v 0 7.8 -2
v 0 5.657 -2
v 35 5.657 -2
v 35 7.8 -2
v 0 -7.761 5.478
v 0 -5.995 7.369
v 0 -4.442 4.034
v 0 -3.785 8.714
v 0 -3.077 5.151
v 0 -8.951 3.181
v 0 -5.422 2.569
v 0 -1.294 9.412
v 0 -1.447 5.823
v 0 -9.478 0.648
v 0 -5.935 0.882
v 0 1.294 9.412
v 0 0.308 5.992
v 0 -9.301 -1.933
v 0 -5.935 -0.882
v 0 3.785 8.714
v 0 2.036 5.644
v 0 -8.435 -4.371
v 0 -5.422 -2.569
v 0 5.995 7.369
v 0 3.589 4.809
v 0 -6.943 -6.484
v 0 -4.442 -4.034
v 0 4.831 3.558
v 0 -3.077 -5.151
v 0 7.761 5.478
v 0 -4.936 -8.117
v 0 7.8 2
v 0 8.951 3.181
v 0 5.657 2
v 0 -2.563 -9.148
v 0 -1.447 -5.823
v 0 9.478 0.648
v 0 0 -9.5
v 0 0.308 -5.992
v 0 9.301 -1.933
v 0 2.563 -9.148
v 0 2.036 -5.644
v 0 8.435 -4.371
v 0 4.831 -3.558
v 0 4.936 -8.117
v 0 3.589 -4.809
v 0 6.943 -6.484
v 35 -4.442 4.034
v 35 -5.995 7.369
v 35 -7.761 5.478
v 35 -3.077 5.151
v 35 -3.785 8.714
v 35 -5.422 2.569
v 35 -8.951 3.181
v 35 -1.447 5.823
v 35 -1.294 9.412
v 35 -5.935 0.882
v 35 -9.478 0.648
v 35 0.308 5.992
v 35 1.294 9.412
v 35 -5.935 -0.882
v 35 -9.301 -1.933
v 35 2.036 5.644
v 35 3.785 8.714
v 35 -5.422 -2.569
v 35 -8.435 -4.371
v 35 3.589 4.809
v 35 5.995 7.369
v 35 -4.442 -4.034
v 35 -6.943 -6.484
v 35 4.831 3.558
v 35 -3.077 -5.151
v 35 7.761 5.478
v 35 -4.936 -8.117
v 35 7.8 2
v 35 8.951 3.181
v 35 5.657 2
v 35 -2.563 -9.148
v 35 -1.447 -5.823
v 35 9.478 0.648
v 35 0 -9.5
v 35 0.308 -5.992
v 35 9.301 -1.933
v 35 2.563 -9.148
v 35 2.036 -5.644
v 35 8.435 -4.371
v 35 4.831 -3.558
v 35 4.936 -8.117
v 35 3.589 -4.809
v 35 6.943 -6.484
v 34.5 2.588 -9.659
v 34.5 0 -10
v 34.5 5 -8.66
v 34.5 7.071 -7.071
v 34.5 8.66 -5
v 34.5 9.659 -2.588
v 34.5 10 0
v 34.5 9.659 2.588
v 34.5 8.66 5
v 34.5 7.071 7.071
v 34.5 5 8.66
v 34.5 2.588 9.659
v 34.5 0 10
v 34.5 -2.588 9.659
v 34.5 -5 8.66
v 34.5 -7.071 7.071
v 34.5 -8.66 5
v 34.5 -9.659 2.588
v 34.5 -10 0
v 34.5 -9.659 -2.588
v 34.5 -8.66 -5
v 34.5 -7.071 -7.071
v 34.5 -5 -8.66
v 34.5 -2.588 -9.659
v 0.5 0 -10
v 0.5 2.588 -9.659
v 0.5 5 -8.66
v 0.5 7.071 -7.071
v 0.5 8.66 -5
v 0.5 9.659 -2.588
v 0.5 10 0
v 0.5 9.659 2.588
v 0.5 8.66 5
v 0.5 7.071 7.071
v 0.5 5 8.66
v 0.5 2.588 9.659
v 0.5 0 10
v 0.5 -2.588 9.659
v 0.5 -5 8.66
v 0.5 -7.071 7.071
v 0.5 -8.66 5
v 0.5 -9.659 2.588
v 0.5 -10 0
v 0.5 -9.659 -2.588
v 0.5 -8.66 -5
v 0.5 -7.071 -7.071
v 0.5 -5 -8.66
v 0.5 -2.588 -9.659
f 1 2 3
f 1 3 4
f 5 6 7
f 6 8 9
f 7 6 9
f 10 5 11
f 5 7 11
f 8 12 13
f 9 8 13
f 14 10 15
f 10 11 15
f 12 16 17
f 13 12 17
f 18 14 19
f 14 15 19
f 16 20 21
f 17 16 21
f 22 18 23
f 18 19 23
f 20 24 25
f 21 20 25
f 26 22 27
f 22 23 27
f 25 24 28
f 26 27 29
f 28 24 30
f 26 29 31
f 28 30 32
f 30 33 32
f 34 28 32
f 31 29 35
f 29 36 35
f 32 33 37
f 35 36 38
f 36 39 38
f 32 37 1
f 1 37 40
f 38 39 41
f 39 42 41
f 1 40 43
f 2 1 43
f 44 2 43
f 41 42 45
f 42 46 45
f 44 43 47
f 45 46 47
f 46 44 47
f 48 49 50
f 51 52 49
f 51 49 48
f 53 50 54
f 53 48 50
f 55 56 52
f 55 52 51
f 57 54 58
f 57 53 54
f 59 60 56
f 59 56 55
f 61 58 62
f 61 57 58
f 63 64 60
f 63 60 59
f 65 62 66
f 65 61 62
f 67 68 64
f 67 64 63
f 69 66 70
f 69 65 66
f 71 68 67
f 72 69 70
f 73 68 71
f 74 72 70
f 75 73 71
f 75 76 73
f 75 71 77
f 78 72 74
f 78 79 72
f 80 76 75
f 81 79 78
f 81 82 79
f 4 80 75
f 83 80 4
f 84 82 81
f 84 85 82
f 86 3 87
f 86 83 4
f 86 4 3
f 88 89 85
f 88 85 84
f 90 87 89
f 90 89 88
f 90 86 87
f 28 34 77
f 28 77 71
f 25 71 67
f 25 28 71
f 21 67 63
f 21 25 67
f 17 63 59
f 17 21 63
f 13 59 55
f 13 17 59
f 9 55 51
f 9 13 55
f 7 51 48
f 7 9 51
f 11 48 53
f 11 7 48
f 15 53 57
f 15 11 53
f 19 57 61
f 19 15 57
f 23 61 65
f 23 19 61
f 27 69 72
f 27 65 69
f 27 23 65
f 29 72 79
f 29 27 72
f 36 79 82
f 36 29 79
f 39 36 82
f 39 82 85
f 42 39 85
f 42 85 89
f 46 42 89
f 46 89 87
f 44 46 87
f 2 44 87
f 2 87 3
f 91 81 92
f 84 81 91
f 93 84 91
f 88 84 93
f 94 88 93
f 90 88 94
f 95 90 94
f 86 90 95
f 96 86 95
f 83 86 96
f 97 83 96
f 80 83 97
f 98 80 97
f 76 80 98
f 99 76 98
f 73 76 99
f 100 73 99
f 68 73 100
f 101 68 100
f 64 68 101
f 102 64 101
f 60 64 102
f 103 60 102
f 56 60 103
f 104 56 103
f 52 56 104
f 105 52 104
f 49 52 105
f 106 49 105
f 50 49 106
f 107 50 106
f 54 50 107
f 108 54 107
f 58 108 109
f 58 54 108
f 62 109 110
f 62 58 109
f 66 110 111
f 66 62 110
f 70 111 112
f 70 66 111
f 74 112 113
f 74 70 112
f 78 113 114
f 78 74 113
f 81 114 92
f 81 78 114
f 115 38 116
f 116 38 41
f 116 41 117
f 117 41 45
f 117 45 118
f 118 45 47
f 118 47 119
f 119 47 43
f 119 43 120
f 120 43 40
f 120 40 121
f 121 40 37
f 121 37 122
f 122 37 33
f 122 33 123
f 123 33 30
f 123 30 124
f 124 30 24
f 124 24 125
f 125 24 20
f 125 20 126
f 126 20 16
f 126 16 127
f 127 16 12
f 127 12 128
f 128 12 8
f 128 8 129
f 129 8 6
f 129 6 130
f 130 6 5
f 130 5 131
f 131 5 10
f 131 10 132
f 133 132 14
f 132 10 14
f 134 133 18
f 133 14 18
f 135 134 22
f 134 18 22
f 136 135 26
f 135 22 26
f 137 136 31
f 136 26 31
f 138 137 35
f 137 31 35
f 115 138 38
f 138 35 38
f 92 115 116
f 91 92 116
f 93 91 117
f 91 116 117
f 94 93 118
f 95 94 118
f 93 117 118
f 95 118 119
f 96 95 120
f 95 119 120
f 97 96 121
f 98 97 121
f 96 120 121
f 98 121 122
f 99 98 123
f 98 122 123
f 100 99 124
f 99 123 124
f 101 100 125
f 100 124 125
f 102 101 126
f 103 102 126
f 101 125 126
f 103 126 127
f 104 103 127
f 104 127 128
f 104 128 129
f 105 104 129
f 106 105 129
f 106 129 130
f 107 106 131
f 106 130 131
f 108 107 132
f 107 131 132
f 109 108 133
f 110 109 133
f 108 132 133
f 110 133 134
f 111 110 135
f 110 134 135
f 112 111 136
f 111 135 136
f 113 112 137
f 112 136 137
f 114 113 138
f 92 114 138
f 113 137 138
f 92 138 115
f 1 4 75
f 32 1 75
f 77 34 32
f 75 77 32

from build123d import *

# Parameters (mm, degrees)
ESQUISSE1_R             = 10
ESQUISSE1_R_2           = 6
BOSS_EXTRU_1_DEPTH      = 35
ESQUISSE2_W             = 4
ESQUISSE2_H             = 6.064626471
ENL_V_MAT_EXTRU_1_DEPTH = 38.749172176
CHANFREIN1_SIZE         = 0.5


with BuildPart() as part:
    # Esquisse1 → Boss.-Extru.1 (new body)
    with BuildSketch(Plane(origin=(0, 0, 0), x_dir=(0, 0, -1), z_dir=(1, 0, 0))):
        Circle(ESQUISSE1_R)
        Circle(ESQUISSE1_R_2, mode=Mode.SUBTRACT)
    extrude(amount=BOSS_EXTRU_1_DEPTH)

    # Esquisse2 → Enlèv. mat.-Extru.1 (cut, through all)
    with BuildSketch(Plane.ZY):
        with Locations((0, 4.767686765)):
            Rectangle(ESQUISSE2_W, ESQUISSE2_H)
    extrude(amount=-ENL_V_MAT_EXTRU_1_DEPTH, mode=Mode.SUBTRACT)

    # Chanfrein1
    chanfrein1_edges = [part.edges().sort_by_distance(p)[0] for p in [
        (0, 0, 10),
        (35, 0, 10),
    ]]
    chamfer(chanfrein1_edges, length=CHANFREIN1_SIZE)


solid = part.part
